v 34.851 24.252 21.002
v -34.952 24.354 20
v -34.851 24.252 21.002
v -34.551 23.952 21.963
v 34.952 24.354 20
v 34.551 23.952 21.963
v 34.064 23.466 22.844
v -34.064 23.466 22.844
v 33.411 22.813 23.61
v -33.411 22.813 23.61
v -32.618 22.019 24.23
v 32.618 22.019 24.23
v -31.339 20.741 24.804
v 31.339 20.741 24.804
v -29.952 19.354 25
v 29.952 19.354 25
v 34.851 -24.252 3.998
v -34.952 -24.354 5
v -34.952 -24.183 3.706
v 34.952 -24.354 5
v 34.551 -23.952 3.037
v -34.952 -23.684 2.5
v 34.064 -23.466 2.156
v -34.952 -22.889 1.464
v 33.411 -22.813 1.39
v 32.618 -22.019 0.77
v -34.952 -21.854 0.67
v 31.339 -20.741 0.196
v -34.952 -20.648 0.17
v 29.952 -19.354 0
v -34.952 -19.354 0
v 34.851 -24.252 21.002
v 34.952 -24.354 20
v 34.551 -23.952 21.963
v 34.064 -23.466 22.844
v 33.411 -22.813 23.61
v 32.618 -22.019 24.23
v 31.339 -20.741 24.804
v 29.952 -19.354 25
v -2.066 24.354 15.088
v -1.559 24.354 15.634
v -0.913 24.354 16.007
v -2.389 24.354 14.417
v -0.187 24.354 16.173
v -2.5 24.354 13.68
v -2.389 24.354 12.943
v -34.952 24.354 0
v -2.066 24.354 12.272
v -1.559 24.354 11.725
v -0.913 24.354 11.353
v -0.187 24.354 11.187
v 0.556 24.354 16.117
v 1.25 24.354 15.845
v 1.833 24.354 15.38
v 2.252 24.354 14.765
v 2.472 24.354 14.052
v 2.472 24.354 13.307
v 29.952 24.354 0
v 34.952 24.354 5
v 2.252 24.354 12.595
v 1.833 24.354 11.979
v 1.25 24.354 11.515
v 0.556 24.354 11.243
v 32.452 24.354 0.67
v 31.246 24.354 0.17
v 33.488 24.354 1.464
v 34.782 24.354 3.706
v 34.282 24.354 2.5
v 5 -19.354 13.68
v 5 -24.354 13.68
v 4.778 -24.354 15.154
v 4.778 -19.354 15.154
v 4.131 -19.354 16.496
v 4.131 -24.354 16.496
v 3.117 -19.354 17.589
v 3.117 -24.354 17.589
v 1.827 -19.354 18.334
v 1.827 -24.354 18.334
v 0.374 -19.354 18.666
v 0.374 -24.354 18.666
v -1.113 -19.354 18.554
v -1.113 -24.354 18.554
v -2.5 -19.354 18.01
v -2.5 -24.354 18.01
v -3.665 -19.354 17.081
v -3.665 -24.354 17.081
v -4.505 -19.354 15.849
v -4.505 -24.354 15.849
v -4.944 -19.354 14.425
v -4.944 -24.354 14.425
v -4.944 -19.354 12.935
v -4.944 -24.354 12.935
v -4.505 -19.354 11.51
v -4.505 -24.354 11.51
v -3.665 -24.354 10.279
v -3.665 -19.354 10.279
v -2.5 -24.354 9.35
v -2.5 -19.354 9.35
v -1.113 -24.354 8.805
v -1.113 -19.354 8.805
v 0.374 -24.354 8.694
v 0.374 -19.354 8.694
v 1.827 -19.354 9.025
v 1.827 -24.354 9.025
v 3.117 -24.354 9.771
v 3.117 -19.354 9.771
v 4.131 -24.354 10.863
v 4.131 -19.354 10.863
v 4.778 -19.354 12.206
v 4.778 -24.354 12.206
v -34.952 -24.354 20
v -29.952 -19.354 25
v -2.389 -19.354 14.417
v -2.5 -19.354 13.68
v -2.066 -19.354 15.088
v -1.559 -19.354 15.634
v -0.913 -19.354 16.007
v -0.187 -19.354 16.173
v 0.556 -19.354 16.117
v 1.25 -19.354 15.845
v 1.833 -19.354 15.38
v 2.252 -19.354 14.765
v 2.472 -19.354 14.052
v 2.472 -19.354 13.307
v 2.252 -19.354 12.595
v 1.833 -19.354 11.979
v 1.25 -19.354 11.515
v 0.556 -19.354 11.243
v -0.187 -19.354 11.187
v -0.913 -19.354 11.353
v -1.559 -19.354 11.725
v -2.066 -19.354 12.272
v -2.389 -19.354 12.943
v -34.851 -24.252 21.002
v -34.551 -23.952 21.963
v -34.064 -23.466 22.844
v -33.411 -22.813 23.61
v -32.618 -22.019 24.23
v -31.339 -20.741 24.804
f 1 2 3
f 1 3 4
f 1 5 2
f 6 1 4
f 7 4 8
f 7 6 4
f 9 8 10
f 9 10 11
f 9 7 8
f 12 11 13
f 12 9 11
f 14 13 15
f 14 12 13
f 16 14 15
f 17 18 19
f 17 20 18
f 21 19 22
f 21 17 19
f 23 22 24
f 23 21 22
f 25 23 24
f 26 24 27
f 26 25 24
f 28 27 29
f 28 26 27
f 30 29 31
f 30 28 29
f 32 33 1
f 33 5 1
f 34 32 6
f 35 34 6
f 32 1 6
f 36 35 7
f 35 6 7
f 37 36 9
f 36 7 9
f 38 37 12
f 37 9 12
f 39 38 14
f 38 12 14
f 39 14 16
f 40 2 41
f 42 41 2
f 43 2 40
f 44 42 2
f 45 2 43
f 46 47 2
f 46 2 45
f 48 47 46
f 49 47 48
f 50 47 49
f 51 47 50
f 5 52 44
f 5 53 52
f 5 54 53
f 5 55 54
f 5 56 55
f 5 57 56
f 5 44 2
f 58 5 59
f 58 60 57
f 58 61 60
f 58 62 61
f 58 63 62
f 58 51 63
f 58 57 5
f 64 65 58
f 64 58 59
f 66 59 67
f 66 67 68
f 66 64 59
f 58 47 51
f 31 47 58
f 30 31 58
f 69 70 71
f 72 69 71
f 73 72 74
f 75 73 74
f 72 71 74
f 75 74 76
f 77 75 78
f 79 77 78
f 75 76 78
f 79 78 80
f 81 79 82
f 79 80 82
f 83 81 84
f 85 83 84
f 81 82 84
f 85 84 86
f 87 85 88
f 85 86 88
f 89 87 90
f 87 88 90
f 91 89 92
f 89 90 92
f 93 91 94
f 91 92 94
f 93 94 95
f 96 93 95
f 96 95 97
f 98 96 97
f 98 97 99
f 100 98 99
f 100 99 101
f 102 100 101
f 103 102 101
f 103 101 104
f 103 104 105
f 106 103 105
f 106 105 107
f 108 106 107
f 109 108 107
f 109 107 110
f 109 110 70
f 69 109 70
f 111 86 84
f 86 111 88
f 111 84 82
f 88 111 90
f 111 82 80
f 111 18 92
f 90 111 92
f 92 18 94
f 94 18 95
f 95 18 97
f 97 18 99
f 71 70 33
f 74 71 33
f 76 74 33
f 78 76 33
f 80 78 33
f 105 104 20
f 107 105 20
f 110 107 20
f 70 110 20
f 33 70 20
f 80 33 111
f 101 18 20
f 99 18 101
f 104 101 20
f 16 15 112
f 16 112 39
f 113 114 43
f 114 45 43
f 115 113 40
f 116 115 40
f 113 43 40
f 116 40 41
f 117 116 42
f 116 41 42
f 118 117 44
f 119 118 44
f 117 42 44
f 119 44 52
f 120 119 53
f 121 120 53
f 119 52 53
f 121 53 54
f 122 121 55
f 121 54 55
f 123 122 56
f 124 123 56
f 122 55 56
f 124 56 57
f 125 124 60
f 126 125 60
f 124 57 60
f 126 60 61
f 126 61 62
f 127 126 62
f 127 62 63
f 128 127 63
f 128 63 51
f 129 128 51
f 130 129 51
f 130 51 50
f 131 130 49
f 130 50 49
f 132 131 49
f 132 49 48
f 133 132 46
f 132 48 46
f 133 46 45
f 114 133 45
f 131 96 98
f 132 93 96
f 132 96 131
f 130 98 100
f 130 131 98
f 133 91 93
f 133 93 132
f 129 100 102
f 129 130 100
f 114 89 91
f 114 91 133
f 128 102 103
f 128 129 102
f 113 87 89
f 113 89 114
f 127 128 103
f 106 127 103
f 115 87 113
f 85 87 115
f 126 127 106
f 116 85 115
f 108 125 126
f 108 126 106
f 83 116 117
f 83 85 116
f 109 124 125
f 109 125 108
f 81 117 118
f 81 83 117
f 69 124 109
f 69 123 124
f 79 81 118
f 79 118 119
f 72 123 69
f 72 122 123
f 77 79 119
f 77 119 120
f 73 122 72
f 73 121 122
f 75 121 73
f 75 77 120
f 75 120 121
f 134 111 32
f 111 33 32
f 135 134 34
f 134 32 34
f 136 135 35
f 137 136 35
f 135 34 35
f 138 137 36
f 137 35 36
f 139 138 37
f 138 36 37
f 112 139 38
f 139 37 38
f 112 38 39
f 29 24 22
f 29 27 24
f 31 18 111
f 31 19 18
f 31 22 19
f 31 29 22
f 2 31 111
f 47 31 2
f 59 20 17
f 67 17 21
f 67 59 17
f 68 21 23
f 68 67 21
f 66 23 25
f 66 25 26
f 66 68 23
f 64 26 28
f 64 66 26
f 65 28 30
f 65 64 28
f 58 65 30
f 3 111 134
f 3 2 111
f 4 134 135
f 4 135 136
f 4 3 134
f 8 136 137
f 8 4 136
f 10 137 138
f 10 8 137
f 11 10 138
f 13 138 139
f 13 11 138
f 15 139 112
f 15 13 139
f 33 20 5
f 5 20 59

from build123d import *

# Parameters (mm, degrees)
F0_W           = 69.9042
F0_H           = 48.707396
F1_DEPTH       = 25
F2_R           = 5
F4_D           = 5
F4_CBORE_D     = 10
F4_CBORE_DEPTH = 5


with BuildPart() as f1:
    # F0 (on Top) → F1 (new body)
    with BuildSketch(Plane.XY):
        Rectangle(F0_W, F0_H)
    extrude(amount=F1_DEPTH)

    # F2
    f2_edges = [f1.edges().sort_by_distance(p)[0] for p in [
        (0, 24.353698, 25),
        (34.9521, 0, 25),
        (0, -24.353698, 25),
        (-34.9521, 0, 25),
        (0, -24.353698, 0),
        (34.9521, 0, 0),
    ]]
    fillet(f2_edges, radius=F2_R)

    # F4 (through all)
    with Locations(Plane.XZ.offset(24.353698)):
        with Locations((0, 13.67986)):
            CounterBoreHole(F4_D / 2, F4_CBORE_D / 2, F4_CBORE_DEPTH)


solid = f1.part
